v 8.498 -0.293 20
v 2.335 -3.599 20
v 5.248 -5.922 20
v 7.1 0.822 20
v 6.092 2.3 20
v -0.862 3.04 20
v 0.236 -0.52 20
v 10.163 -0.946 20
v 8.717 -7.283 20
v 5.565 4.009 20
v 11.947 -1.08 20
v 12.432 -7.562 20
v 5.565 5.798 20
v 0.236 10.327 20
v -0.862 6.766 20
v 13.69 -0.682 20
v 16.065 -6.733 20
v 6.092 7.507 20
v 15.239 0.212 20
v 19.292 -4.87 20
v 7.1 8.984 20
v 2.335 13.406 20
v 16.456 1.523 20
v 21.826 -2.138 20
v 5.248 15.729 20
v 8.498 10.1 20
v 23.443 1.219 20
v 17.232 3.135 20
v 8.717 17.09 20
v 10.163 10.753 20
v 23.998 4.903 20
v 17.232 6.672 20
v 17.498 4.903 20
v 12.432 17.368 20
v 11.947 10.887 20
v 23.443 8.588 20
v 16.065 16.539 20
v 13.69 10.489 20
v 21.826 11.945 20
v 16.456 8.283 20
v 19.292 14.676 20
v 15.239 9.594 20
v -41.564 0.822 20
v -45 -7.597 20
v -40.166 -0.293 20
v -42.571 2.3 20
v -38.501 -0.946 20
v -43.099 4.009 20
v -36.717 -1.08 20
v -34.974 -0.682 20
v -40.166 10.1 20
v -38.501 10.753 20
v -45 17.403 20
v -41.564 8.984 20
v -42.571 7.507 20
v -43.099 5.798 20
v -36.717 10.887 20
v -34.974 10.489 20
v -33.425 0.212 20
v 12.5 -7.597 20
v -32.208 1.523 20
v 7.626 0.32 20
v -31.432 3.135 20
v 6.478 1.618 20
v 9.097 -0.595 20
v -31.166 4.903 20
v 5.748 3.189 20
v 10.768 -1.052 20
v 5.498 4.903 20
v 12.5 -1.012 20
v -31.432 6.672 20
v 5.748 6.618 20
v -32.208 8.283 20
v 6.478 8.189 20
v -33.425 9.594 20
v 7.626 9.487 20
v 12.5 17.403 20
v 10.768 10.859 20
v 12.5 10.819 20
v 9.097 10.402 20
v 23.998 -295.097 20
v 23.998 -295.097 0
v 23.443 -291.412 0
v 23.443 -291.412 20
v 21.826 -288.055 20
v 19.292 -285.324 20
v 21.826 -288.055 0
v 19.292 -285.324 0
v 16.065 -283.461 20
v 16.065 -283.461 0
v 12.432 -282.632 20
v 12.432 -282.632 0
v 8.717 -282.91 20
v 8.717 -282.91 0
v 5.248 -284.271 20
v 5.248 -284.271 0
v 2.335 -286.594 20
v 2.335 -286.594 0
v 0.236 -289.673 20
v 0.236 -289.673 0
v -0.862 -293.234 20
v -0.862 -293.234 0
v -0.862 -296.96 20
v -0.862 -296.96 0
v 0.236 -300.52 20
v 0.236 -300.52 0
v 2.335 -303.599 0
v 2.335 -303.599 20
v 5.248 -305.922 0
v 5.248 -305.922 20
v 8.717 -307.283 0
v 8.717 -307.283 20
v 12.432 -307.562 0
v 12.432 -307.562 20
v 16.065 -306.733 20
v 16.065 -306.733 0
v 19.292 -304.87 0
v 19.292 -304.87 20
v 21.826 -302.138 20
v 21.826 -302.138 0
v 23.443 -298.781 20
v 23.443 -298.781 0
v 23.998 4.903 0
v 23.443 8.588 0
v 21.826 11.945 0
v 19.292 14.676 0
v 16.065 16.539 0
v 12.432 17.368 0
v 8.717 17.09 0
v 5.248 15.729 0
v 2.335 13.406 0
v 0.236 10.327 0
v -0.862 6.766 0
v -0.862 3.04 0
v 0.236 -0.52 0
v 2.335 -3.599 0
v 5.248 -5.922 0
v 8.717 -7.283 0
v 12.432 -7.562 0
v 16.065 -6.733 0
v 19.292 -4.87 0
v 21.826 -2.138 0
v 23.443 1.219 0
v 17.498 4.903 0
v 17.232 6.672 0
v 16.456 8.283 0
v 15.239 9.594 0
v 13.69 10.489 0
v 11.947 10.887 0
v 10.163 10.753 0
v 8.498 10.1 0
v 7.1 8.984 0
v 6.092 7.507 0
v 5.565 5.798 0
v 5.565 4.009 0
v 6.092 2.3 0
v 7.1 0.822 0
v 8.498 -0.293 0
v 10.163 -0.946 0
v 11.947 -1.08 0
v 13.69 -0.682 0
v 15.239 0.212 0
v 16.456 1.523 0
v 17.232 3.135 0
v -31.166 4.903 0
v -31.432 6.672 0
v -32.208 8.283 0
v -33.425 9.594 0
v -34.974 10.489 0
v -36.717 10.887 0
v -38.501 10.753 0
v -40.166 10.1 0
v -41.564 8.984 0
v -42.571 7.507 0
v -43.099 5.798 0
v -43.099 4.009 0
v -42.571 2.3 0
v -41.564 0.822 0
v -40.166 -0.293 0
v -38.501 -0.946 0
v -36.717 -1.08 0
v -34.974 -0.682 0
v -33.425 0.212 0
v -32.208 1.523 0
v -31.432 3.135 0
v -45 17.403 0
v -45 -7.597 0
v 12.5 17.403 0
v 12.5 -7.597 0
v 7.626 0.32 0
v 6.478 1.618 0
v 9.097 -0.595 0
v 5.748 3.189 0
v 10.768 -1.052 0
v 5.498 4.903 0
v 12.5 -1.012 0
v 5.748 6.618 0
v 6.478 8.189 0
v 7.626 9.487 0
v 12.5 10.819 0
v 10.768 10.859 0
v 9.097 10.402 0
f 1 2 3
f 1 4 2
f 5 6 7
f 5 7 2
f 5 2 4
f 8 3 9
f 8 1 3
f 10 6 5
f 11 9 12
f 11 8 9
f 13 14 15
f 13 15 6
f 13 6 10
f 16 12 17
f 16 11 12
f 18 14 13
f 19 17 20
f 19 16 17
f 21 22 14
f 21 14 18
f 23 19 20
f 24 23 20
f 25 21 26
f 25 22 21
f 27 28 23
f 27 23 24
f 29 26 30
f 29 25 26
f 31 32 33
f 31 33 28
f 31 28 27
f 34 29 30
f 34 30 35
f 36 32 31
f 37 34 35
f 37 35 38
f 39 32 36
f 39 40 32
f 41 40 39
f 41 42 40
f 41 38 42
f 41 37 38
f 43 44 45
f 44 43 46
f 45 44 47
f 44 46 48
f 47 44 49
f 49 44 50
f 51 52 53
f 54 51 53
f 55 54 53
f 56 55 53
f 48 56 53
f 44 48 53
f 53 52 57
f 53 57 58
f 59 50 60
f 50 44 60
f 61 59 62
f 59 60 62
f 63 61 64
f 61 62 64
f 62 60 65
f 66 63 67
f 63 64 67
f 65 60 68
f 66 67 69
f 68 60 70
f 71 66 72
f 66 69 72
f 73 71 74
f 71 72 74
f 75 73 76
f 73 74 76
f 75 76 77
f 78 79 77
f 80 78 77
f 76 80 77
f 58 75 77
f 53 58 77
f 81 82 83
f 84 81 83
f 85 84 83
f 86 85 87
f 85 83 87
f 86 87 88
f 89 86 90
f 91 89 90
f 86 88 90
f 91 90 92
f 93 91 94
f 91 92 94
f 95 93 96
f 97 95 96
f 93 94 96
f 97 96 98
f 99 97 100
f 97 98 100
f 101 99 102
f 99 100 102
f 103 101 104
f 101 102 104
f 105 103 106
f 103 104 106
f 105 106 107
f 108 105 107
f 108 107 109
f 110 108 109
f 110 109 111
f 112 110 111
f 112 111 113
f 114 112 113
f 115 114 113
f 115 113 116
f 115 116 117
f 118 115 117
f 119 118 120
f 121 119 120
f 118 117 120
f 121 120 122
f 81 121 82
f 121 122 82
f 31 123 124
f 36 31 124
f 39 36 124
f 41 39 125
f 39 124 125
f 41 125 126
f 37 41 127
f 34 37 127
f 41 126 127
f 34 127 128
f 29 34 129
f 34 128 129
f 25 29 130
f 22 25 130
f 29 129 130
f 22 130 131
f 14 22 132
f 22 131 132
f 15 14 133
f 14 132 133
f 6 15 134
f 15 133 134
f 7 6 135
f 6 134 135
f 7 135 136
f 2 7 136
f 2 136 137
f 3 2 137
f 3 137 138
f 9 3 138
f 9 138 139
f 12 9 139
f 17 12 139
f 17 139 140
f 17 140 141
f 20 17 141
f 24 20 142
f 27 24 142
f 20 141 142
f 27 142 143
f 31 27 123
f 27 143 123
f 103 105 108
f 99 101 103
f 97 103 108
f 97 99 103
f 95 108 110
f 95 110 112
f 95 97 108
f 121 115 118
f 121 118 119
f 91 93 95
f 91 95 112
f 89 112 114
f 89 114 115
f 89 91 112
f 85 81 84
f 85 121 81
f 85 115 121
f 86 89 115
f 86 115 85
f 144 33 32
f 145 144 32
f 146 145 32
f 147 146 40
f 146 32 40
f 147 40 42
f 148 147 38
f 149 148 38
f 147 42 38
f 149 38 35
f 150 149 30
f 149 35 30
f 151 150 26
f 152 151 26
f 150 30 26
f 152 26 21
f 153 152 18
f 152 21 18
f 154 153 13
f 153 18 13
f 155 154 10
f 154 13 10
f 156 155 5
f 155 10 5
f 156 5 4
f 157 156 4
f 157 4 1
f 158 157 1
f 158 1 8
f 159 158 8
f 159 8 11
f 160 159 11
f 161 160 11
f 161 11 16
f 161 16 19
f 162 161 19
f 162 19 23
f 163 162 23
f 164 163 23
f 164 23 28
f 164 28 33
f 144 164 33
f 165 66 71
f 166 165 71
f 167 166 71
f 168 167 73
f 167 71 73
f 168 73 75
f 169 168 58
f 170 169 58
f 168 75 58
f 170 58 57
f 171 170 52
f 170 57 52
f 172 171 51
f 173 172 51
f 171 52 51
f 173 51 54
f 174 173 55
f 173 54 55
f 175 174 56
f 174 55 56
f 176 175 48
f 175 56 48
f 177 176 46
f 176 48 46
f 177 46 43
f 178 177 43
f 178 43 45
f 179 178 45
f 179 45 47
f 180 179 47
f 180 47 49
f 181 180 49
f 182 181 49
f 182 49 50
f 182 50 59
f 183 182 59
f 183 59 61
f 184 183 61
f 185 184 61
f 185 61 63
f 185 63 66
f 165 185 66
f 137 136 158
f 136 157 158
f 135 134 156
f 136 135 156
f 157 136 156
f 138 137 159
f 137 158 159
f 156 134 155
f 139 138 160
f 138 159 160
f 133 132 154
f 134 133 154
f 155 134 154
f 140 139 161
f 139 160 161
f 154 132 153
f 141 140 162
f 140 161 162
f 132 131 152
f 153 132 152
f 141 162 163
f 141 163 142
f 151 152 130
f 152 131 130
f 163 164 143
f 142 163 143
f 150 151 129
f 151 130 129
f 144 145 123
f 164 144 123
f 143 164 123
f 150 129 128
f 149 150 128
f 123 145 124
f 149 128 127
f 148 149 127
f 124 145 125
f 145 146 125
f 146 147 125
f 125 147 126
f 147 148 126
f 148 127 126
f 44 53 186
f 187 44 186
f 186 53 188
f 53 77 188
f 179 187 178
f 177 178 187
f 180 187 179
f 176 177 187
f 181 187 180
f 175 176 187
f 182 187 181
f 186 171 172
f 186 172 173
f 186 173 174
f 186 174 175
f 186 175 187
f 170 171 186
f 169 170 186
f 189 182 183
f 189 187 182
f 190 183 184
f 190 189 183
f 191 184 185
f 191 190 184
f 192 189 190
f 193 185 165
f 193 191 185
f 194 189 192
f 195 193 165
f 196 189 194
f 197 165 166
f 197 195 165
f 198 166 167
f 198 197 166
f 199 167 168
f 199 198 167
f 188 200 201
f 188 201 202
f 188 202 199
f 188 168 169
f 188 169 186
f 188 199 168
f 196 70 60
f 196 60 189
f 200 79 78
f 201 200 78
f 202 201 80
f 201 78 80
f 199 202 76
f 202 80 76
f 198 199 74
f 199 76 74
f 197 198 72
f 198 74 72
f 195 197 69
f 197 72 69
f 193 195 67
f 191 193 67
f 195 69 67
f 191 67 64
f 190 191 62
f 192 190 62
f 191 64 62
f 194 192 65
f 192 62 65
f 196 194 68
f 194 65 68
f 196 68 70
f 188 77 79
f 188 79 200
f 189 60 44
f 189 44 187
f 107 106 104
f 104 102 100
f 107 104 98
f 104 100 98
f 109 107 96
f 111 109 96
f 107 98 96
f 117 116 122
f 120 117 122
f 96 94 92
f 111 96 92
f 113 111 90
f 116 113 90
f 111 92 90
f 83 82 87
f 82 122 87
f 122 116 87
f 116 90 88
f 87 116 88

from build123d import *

# Parameters (mm, degrees)
ESBO_O1_R                     = 12.5
RESSALTO_EXTRUS_O6_DEPTH      = 20
RESSALTO_EXTRUS_O6_2_DEPTH    = 20
ESBO_O3_W                     = 20
ESBO_O3_H                     = 25
RESSALTO_EXTRUS_O7_DEPTH      = 12.5
RESSALTO_EXTRUS_O7_DEPTH_BACK = 45
ESBO_O4_R                     = 6
CORTE_EXTRUS_O1_DEPTH         = 45


with BuildPart() as part:
    # Esboço1 → Ressalto-extrusão6 (new body)
    with BuildSketch(Plane.XY):
        with Locations((11.498120919, 4.903388149)):
            Circle(ESBO_O1_R)
    extrude(amount=RESSALTO_EXTRUS_O6_DEPTH)


with BuildPart() as body_2:
    # Esboço1 → Ressalto-extrus_o6 2 (new body)
    with BuildSketch(Plane.XY):
        with Locations((11.498120919, -295.096611851)):
            Circle(ESBO_O1_R)
    extrude(amount=RESSALTO_EXTRUS_O6_2_DEPTH)


with BuildPart() as body_3:
    # Esboço3 → Ressalto-extrusão7 (new body, two sides)
    with BuildSketch(Plane(origin=(0, 0, 0), x_dir=(0, 0, -1), z_dir=(1, 0, 0))) as ressalto_extrus_o7_sk:
        with Locations((-10, 4.903388149)):
            Rectangle(ESBO_O3_W, ESBO_O3_H)
    extrude(amount=RESSALTO_EXTRUS_O7_DEPTH)
    extrude(ressalto_extrus_o7_sk.sketch, amount=-RESSALTO_EXTRUS_O7_DEPTH_BACK)


with BuildPart() as corte_extrus_o1_tool:
    # Esboço4 → Corte-extrusão1 (new body)
    with BuildSketch(Plane.XY.offset(20)):
        with Locations((11.498120919, 4.903388149)):
            Circle(ESBO_O4_R)
        with Locations((-37.165592143, 4.903388149)):
            Circle(ESBO_O4_R)
    extrude(amount=-CORTE_EXTRUS_O1_DEPTH)


with BuildPart() as part_1:
    add(part.part)

    # Corte-extrusão1: cut by corte_extrus_o1_tool
    add(corte_extrus_o1_tool.part, mode=Mode.SUBTRACT)


with BuildPart() as body_3_1:
    add(body_3.part)

    # Corte-extrusão1: cut by corte_extrus_o1_tool
    add(corte_extrus_o1_tool.part, mode=Mode.SUBTRACT)


solid = Compound([body_2.part, part_1.part, body_3_1.part])
